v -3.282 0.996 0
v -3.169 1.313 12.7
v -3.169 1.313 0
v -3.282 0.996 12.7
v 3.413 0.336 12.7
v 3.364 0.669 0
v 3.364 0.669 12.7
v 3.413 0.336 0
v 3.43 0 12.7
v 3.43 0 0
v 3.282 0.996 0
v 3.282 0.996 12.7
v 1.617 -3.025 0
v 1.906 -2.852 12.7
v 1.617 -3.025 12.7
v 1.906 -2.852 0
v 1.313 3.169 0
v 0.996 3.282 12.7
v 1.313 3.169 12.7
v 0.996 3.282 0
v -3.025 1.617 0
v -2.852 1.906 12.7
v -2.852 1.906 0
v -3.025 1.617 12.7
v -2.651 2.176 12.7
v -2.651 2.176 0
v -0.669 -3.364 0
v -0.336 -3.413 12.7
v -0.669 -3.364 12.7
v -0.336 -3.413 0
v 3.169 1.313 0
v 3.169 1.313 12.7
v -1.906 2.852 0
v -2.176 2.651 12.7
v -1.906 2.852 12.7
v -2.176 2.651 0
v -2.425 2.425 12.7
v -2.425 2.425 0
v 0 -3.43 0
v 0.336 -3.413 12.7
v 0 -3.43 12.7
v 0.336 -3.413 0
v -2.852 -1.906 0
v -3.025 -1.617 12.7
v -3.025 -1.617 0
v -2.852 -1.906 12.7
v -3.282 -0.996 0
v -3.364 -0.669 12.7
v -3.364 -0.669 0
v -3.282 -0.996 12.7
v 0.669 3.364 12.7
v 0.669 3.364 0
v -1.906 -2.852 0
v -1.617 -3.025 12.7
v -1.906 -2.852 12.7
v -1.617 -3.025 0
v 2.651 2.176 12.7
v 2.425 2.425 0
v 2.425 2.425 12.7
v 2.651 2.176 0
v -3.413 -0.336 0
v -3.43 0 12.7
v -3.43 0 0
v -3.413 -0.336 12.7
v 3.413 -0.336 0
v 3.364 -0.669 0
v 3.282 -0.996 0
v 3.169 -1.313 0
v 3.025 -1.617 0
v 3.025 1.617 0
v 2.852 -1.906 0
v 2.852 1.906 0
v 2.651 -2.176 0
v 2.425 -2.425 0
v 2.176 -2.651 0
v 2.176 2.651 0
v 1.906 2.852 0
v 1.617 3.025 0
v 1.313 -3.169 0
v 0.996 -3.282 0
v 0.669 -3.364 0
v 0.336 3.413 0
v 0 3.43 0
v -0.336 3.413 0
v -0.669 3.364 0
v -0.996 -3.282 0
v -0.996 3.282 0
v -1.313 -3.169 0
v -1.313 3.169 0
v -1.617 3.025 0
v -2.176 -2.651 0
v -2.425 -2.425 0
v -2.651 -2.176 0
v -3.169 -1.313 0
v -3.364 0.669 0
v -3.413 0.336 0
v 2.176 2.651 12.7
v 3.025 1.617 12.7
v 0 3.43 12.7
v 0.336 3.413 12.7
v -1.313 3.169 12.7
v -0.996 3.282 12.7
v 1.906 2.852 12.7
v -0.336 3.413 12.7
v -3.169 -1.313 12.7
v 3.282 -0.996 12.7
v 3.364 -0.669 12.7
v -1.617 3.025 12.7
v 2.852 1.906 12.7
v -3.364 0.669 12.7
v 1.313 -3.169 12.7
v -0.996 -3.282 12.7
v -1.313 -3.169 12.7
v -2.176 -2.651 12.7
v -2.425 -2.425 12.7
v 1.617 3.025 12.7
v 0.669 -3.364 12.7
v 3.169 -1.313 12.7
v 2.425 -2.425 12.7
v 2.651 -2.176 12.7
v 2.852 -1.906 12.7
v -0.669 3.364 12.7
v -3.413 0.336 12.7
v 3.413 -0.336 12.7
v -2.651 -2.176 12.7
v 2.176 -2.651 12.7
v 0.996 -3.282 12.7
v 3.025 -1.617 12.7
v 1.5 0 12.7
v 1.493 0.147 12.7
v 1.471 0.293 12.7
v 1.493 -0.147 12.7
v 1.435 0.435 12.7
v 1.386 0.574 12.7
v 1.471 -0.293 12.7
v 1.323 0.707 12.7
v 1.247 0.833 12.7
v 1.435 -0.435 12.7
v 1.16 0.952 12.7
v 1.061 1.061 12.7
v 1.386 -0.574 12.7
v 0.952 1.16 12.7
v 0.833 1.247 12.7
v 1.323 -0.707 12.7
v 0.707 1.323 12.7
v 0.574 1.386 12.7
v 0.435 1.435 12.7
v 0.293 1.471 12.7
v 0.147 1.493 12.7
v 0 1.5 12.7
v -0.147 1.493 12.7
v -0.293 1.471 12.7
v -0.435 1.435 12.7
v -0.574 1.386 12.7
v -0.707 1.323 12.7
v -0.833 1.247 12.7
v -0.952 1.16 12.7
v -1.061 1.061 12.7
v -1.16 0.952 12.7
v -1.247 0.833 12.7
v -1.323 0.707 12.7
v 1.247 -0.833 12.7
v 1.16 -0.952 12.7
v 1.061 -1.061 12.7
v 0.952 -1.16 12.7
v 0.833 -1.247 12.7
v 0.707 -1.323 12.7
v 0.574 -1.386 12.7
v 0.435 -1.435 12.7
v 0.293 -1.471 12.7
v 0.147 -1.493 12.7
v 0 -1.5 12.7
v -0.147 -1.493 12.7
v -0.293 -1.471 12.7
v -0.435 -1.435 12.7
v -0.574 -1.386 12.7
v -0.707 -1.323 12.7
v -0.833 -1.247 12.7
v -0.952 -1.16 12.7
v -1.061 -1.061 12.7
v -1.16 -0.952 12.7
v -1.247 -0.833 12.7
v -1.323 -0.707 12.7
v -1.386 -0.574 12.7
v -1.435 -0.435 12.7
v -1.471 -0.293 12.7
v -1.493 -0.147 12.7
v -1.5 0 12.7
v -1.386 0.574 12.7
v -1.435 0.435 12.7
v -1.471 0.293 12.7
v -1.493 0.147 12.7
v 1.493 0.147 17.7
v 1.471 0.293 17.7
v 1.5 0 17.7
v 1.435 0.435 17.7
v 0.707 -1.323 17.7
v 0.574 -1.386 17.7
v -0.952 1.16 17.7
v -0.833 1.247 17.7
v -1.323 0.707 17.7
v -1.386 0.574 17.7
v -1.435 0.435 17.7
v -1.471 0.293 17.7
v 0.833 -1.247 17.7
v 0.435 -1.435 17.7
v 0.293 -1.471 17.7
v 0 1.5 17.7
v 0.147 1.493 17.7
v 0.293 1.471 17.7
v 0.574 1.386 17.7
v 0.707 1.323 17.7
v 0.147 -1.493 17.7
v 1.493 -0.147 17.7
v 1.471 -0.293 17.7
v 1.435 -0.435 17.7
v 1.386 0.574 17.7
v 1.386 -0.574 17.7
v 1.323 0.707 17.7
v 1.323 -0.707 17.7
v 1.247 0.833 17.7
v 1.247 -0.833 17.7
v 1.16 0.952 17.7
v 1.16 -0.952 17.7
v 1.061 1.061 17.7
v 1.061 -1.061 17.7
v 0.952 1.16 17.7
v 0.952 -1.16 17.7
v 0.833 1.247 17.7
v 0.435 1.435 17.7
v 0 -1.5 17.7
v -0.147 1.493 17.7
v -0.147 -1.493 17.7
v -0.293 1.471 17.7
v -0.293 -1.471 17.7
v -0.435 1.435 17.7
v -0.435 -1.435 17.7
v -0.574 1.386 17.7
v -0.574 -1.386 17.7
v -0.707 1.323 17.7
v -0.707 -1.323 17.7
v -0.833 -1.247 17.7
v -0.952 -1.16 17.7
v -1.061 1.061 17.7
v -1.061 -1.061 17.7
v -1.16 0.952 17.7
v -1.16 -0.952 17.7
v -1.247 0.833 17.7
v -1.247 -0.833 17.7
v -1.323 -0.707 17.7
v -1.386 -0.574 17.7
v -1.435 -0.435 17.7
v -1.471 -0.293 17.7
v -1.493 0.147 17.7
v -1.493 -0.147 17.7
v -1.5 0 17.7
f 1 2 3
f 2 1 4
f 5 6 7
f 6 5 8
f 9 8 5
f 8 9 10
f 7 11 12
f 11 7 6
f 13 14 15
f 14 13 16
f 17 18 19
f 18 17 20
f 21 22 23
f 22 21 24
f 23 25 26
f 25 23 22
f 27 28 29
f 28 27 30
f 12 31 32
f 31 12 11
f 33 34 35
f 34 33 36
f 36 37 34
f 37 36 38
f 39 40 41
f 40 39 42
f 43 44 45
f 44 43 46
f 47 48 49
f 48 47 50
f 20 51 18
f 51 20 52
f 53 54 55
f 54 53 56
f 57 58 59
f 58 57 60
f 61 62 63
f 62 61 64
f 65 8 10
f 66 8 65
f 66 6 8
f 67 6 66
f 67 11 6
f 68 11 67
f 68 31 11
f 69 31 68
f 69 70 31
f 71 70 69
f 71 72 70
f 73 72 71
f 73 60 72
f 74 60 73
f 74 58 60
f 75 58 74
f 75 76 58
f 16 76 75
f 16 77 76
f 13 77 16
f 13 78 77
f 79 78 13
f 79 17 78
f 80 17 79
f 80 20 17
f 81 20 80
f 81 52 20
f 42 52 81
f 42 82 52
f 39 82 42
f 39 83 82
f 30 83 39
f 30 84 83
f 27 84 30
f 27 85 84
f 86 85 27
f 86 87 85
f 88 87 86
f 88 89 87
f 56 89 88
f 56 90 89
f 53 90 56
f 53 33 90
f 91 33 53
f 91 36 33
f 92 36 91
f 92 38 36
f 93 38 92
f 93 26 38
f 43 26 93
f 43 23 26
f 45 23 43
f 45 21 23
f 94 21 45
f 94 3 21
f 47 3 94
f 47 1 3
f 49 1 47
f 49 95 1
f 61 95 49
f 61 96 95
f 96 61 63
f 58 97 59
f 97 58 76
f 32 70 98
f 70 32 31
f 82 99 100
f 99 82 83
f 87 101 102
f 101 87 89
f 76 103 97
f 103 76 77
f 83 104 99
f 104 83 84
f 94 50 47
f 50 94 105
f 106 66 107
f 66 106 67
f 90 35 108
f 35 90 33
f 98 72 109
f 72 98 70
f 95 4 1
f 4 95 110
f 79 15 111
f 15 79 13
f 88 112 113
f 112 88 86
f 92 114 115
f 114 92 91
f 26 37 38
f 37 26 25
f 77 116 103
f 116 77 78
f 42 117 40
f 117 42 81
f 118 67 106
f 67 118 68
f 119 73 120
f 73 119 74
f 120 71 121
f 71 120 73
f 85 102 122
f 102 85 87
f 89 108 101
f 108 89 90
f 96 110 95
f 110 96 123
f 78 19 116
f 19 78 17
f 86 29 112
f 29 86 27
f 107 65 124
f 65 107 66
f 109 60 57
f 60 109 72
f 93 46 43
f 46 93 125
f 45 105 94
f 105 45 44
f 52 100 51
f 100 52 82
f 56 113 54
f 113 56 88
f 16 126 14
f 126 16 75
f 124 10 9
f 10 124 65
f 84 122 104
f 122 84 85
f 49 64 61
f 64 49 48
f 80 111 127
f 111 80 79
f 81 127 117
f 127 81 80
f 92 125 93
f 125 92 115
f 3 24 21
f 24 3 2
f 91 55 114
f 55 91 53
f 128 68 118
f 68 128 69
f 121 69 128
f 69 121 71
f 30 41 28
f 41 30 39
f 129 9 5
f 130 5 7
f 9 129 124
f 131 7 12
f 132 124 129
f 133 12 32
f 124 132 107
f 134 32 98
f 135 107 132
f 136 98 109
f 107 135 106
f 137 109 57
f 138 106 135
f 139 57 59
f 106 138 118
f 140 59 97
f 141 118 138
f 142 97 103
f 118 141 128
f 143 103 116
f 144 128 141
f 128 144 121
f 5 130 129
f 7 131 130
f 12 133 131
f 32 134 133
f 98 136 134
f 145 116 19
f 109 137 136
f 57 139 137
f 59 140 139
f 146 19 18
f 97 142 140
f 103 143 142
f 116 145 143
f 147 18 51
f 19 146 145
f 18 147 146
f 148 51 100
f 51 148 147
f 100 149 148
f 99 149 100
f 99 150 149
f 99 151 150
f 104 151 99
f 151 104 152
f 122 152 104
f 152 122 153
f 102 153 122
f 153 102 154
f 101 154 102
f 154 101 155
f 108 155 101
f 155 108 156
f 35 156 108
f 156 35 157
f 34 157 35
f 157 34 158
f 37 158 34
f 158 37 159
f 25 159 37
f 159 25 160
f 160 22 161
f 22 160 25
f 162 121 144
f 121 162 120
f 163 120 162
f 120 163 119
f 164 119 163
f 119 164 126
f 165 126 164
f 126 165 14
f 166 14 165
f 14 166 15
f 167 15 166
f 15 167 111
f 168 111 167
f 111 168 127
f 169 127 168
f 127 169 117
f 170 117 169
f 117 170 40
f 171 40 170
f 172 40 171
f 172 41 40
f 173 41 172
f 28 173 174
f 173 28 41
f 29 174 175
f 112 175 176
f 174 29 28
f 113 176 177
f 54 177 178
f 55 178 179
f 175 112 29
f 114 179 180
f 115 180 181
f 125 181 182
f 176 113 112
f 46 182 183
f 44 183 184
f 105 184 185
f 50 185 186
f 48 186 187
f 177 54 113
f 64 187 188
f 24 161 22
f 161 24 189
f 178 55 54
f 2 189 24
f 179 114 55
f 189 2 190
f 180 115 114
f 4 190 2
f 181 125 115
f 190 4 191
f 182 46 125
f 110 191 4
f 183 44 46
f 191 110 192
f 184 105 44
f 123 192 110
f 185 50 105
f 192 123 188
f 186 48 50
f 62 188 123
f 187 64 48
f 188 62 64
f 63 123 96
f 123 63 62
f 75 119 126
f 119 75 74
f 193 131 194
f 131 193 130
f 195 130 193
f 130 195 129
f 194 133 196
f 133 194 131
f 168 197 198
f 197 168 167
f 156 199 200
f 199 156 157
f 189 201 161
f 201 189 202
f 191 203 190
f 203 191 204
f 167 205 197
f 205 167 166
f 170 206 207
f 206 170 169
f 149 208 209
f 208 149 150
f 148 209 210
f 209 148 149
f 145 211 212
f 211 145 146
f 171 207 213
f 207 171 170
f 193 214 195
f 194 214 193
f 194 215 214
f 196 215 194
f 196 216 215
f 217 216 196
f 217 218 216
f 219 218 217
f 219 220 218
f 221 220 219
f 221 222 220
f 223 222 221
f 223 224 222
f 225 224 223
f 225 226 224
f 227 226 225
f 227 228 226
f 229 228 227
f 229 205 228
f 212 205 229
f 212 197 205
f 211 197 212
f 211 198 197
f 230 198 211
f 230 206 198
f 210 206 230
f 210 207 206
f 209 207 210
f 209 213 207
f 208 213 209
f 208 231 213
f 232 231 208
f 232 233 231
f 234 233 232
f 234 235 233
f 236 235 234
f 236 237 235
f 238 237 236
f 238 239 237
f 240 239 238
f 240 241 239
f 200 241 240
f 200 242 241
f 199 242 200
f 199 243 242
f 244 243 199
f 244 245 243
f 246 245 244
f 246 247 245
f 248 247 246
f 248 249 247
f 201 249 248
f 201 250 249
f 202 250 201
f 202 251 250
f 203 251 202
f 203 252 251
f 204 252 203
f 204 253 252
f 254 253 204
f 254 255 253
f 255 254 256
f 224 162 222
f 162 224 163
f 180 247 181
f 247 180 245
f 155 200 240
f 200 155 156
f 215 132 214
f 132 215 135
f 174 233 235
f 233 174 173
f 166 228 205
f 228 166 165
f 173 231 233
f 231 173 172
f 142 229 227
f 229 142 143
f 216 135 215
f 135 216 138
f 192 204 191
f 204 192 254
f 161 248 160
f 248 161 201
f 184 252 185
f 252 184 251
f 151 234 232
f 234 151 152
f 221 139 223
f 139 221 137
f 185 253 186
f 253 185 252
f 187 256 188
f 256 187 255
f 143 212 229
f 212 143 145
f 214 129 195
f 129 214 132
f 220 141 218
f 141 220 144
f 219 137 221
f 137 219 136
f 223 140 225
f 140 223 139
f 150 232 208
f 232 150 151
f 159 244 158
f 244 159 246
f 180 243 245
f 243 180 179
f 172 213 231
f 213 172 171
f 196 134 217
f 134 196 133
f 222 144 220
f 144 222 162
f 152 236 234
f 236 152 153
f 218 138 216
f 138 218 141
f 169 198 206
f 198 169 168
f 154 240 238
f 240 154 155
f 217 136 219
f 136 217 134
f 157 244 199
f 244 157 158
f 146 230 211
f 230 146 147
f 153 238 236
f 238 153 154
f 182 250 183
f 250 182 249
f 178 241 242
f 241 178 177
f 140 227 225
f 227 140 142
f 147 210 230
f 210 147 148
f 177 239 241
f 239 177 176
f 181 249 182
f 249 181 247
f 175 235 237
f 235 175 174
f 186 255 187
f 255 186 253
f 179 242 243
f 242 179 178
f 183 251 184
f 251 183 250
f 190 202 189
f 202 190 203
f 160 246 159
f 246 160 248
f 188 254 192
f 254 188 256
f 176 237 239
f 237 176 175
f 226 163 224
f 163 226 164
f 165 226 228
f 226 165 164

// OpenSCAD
module toggle_switch() {
    union() {
        // Main cylindrical body
        cylinder(h=12.7, d=6.86, $fn=64);
        
        // Toggle lever
        translate([0, 0, 12.7])
            cylinder(h=5, d=3, $fn=64);
    }
}

toggle_switch();
